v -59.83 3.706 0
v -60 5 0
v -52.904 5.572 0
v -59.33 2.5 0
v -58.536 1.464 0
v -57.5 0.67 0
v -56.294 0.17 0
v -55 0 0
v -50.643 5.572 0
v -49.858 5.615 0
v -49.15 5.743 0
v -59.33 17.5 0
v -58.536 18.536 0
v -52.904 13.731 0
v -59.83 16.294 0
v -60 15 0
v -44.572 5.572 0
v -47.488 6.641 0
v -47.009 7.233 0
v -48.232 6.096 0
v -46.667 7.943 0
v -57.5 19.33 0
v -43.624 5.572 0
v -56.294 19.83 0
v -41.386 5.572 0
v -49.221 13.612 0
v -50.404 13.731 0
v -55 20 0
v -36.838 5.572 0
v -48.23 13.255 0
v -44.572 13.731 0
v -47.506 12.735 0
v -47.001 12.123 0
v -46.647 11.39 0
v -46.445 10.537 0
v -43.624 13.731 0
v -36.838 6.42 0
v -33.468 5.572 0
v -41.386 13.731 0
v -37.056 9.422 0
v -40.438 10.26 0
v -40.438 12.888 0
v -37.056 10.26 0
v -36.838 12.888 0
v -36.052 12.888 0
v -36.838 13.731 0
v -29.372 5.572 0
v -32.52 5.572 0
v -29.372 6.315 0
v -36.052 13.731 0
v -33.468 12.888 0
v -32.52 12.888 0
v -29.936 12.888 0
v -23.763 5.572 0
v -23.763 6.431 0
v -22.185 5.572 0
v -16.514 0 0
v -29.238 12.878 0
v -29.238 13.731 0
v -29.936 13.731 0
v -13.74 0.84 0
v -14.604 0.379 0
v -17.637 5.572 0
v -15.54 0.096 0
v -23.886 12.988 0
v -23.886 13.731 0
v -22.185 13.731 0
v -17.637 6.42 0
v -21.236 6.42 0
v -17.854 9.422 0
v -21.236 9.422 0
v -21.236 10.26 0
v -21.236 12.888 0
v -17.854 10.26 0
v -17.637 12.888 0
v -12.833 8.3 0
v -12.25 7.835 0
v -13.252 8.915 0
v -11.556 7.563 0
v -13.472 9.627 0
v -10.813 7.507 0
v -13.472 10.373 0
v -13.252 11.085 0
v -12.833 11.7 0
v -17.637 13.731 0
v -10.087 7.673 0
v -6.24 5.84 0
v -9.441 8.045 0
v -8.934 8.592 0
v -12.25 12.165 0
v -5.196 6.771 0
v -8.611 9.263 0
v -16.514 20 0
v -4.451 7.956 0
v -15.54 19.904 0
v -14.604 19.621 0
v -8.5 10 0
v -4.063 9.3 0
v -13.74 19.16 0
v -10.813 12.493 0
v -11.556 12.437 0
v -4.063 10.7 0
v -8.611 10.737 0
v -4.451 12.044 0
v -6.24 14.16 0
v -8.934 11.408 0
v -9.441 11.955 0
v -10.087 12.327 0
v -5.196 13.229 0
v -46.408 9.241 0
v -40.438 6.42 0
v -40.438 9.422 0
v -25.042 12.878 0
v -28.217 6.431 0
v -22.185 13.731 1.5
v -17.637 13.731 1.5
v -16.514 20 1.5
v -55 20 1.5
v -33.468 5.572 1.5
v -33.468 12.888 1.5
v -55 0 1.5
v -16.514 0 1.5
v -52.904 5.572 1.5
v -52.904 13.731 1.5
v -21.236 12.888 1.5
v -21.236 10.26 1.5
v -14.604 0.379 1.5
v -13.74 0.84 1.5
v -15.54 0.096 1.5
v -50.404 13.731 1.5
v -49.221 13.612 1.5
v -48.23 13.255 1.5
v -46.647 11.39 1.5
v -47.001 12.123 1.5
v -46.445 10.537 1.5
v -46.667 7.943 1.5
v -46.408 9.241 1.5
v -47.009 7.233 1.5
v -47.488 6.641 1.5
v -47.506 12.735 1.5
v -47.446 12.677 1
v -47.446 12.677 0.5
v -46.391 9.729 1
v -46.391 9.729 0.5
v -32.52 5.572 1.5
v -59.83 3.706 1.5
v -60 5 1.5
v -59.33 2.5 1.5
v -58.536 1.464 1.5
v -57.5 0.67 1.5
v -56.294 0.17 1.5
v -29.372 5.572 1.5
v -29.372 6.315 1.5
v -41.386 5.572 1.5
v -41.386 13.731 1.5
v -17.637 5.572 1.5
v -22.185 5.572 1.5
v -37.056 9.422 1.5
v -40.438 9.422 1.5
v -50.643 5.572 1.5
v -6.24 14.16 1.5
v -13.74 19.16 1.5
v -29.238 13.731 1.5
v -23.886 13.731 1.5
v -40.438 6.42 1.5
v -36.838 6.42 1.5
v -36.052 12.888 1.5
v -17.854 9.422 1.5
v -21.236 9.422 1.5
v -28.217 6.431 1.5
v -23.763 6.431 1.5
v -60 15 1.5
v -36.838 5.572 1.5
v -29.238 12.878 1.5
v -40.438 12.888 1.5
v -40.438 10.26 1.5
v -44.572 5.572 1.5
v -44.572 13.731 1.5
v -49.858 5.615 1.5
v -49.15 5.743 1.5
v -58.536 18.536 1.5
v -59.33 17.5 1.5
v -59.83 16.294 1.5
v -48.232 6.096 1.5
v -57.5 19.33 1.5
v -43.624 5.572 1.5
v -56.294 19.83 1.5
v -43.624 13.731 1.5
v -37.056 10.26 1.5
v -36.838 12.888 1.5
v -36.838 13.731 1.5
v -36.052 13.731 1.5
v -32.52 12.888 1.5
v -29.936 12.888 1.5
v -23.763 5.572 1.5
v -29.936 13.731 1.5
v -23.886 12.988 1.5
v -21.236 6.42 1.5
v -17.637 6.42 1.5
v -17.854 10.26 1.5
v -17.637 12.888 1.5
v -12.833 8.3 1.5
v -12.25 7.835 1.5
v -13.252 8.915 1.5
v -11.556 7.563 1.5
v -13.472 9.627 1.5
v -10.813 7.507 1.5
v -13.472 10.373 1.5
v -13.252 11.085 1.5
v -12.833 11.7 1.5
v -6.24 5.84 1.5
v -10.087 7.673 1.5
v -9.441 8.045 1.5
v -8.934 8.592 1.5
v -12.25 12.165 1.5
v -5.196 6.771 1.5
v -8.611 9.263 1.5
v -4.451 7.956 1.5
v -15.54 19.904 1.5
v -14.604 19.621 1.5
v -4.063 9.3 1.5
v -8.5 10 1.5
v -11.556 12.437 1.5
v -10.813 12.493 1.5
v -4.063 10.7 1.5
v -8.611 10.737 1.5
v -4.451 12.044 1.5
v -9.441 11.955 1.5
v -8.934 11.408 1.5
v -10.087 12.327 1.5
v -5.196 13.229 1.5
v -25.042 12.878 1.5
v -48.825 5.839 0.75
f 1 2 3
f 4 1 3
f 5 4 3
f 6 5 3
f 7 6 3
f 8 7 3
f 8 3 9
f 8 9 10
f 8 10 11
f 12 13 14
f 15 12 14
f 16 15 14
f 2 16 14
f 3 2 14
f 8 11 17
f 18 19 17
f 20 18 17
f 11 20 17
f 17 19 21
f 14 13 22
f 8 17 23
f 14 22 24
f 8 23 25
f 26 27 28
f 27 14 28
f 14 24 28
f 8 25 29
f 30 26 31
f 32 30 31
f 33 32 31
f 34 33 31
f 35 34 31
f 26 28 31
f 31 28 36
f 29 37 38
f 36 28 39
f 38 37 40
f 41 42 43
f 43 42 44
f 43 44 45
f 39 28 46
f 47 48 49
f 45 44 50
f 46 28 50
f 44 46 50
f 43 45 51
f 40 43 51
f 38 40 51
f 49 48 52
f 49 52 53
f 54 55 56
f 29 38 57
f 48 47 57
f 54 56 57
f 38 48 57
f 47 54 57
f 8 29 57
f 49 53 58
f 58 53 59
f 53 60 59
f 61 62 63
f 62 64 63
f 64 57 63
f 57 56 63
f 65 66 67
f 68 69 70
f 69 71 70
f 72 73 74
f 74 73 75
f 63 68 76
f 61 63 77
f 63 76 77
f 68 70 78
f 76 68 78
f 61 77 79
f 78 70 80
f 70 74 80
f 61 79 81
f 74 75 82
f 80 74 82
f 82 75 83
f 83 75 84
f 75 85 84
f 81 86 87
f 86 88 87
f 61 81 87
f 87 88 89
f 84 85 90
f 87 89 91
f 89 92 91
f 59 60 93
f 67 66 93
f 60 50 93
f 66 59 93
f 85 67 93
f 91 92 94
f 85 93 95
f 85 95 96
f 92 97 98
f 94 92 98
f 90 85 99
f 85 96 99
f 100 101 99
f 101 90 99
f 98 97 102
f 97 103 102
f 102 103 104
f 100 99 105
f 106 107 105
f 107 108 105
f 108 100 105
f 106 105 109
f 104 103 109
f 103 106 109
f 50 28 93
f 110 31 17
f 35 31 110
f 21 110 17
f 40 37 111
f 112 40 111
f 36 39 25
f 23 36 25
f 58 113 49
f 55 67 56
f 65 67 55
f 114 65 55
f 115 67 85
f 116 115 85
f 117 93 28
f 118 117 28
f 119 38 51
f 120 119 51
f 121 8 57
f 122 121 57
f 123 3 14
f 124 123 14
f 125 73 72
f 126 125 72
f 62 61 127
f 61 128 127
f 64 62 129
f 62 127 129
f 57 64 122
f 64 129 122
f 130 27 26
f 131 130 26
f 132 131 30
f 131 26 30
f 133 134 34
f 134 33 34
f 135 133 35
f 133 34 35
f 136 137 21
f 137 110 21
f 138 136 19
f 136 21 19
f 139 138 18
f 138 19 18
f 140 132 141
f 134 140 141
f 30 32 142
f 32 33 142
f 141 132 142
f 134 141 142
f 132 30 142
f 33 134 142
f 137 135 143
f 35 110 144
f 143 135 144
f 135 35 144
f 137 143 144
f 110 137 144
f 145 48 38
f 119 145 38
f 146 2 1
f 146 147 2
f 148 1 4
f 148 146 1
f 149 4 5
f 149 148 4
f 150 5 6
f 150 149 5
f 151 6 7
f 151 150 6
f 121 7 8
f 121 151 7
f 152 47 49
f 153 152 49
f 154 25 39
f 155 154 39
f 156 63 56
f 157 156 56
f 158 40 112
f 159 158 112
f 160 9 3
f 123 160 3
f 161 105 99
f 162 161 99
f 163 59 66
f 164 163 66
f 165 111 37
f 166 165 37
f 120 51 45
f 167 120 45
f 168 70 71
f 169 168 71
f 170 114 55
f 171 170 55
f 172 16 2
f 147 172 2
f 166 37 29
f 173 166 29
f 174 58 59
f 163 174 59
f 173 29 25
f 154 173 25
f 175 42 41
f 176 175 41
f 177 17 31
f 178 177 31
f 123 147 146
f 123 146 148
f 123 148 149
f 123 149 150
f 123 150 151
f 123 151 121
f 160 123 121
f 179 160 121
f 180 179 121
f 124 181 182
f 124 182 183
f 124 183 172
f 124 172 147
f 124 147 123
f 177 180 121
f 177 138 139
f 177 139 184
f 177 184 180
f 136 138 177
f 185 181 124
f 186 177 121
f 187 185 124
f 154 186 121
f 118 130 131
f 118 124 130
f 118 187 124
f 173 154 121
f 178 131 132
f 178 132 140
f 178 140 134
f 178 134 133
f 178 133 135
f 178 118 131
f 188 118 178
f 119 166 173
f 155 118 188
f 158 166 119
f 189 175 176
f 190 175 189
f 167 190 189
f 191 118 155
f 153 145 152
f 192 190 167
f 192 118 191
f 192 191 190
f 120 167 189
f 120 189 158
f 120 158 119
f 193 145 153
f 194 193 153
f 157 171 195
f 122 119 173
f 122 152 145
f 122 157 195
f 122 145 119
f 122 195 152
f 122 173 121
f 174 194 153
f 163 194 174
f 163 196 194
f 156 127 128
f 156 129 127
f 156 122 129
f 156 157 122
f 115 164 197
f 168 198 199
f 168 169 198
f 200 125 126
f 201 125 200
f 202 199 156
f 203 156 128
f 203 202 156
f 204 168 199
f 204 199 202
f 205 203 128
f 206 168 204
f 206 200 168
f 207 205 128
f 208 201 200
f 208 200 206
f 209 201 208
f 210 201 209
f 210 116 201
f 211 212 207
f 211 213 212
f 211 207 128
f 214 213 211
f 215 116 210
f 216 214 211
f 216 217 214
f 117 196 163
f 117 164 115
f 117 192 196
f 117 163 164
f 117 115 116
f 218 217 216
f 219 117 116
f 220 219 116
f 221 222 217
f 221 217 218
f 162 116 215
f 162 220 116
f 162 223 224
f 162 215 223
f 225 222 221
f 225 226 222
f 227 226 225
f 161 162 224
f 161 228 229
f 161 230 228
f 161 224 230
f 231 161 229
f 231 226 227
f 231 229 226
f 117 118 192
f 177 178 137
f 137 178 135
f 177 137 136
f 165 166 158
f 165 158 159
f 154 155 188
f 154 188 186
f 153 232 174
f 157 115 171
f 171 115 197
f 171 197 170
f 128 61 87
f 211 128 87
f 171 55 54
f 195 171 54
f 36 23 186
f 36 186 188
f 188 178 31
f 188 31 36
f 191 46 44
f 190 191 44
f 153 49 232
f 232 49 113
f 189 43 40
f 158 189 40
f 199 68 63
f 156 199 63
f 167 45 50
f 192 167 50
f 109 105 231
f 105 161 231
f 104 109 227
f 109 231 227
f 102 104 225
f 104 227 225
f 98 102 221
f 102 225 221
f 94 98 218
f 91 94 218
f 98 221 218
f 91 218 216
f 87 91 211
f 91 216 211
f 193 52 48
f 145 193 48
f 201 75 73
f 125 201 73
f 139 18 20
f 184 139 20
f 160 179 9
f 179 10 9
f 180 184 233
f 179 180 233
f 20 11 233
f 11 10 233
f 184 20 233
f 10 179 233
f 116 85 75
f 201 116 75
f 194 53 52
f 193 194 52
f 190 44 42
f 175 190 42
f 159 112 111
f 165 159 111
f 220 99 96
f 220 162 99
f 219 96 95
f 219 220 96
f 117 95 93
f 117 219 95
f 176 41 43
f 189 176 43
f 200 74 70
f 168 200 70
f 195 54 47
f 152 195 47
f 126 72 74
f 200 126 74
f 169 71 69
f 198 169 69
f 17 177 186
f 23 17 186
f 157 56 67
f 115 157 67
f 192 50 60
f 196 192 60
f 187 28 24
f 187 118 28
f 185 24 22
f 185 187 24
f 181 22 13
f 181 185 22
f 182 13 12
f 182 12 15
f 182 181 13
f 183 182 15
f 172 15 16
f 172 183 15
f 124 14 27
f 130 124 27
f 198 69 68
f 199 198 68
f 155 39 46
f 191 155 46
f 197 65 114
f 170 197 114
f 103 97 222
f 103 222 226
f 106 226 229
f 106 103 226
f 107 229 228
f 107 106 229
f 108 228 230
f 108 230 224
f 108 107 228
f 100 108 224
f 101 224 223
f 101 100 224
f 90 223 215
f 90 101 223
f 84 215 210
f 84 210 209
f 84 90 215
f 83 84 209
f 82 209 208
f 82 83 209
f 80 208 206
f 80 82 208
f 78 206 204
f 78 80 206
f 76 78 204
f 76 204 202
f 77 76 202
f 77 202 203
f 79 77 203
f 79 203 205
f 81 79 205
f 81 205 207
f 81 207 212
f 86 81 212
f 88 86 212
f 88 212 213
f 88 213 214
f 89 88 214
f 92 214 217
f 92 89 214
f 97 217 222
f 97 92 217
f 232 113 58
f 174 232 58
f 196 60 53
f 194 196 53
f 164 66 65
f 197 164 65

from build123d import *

# Parameters (mm, degrees)
F0_W     = 0.9482001415
F0_H     = 8.158806867
F0_R     = 2.5
F1_DEPTH = 1.5
F2_R     = 5
F3_R     = 5


with BuildPart() as f1:
    # F0 (on Top) → F1 (new body)
    with BuildSketch(Plane.XY):
        Polygon((-15, 20), (-60, 20), (-60, 0), (-15, 0), (0, 10), align=None)
        with BuildLine():
            add(Edge.make_bspline(
                [(-47.4459262549, 12.6766424166), (-46.3914776983, 11.62219386), (-46.3914776983, 9.7293649524)],
                knots=[0, 0, 0, 1, 1, 1], degree=2))
            add(Edge.make_bspline(
                [(-46.3914776983, 9.7293649524), (-46.3914776983, 7.7097522217), (-47.4878899146, 6.6410181639)],
                knots=[0, 0, 0, 1, 1, 1], degree=2))
            add(Edge.make_bspline(
                [(-47.4878899146, 6.6410181639), (-48.5843021309, 5.5722841062), (-50.6431999899, 5.5722841062)],
                knots=[0, 0, 0, 1, 1, 1], degree=2))
            Line((-50.6431999899, 5.5722841062), (-52.9038805532, 5.5722841062))
            Line((-52.9038805532, 5.5722841062), (-52.9038805532, 13.7310909731))
            Line((-52.9038805532, 13.7310909731), (-50.403917845, 13.7310909731))
            add(Edge.make_bspline(
                [(-50.403917845, 13.7310909731), (-48.5003748114, 13.7310909731), (-47.4459262549, 12.6766424166)],
                knots=[0, 0, 0, 1, 1, 1], degree=2))
        make_face(mode=Mode.SUBTRACT)
        with Locations((-44.0977619135, 9.6516875396)):
            Rectangle(F0_W, F0_H, mode=Mode.SUBTRACT)
        Polygon((-36.8380487777, 6.4204857393), (-36.8380487777, 5.5722841062), (-41.386195219, 5.5722841062), (-41.386195219, 13.7310909731), (-36.8380487777, 13.7310909731), (-36.8380487777, 12.8882464029), (-40.4379950775, 12.8882464029), (-40.4379950775, 10.259714184), (-37.0559026708, 10.259714184), (-37.0559026708, 9.4222266768), (-40.4379950775, 9.4222266768), (-40.4379950775, 6.4204857393), align=None, mode=Mode.SUBTRACT)
        Polygon((-32.5202560431, 12.8882464029), (-32.5202560431, 5.5722841062), (-33.4684561846, 5.5722841062), (-33.4684561846, 12.8882464029), (-36.0523462123, 12.8882464029), (-36.0523462123, 13.7310909731), (-29.9363660154, 13.7310909731), (-29.9363660154, 12.8882464029), align=None, mode=Mode.SUBTRACT)
        Polygon((-23.7632438138, 6.4311998652), (-23.7632438138, 5.5722841062), (-29.3720887184, 5.5722841062), (-29.3720887184, 6.315130168), (-25.0417961703, 12.877532277), (-29.2381621448, 12.877532277), (-29.2381621448, 13.7310909731), (-23.8864562616, 13.7310909731), (-23.8864562616, 12.9882449113), (-28.2167488097, 6.4311998652), align=None, mode=Mode.SUBTRACT)
        Polygon((-17.6365494911, 6.4204857393), (-17.6365494911, 5.5722841062), (-22.1846959324, 5.5722841062), (-22.1846959324, 13.7310909731), (-17.6365494911, 13.7310909731), (-17.6365494911, 12.8882464029), (-21.2364957909, 12.8882464029), (-21.2364957909, 10.259714184), (-17.8544033843, 10.259714184), (-17.8544033843, 9.4222266768), (-21.2364957909, 9.4222266768), (-21.2364957909, 6.4204857393), align=None, mode=Mode.SUBTRACT)
        with Locations((-11, 10)):
            Circle(F0_R, mode=Mode.SUBTRACT)
    extrude(amount=F1_DEPTH)

    # F2
    f2_edges = [f1.edges().sort_by_distance(p)[0] for p in [
        (0, 10, 0.75),
    ]]
    fillet(f2_edges, radius=F2_R)

    # F3
    f3_edges = [f1.edges().sort_by_distance(p)[0] for p in [
        (-60, 20, 0.75),
        (-60, 0, 0.75),
        (-15, 0, 0.75),
        (-15, 20, 0.75),
    ]]
    fillet(f3_edges, radius=F3_R)


solid = f1.part
